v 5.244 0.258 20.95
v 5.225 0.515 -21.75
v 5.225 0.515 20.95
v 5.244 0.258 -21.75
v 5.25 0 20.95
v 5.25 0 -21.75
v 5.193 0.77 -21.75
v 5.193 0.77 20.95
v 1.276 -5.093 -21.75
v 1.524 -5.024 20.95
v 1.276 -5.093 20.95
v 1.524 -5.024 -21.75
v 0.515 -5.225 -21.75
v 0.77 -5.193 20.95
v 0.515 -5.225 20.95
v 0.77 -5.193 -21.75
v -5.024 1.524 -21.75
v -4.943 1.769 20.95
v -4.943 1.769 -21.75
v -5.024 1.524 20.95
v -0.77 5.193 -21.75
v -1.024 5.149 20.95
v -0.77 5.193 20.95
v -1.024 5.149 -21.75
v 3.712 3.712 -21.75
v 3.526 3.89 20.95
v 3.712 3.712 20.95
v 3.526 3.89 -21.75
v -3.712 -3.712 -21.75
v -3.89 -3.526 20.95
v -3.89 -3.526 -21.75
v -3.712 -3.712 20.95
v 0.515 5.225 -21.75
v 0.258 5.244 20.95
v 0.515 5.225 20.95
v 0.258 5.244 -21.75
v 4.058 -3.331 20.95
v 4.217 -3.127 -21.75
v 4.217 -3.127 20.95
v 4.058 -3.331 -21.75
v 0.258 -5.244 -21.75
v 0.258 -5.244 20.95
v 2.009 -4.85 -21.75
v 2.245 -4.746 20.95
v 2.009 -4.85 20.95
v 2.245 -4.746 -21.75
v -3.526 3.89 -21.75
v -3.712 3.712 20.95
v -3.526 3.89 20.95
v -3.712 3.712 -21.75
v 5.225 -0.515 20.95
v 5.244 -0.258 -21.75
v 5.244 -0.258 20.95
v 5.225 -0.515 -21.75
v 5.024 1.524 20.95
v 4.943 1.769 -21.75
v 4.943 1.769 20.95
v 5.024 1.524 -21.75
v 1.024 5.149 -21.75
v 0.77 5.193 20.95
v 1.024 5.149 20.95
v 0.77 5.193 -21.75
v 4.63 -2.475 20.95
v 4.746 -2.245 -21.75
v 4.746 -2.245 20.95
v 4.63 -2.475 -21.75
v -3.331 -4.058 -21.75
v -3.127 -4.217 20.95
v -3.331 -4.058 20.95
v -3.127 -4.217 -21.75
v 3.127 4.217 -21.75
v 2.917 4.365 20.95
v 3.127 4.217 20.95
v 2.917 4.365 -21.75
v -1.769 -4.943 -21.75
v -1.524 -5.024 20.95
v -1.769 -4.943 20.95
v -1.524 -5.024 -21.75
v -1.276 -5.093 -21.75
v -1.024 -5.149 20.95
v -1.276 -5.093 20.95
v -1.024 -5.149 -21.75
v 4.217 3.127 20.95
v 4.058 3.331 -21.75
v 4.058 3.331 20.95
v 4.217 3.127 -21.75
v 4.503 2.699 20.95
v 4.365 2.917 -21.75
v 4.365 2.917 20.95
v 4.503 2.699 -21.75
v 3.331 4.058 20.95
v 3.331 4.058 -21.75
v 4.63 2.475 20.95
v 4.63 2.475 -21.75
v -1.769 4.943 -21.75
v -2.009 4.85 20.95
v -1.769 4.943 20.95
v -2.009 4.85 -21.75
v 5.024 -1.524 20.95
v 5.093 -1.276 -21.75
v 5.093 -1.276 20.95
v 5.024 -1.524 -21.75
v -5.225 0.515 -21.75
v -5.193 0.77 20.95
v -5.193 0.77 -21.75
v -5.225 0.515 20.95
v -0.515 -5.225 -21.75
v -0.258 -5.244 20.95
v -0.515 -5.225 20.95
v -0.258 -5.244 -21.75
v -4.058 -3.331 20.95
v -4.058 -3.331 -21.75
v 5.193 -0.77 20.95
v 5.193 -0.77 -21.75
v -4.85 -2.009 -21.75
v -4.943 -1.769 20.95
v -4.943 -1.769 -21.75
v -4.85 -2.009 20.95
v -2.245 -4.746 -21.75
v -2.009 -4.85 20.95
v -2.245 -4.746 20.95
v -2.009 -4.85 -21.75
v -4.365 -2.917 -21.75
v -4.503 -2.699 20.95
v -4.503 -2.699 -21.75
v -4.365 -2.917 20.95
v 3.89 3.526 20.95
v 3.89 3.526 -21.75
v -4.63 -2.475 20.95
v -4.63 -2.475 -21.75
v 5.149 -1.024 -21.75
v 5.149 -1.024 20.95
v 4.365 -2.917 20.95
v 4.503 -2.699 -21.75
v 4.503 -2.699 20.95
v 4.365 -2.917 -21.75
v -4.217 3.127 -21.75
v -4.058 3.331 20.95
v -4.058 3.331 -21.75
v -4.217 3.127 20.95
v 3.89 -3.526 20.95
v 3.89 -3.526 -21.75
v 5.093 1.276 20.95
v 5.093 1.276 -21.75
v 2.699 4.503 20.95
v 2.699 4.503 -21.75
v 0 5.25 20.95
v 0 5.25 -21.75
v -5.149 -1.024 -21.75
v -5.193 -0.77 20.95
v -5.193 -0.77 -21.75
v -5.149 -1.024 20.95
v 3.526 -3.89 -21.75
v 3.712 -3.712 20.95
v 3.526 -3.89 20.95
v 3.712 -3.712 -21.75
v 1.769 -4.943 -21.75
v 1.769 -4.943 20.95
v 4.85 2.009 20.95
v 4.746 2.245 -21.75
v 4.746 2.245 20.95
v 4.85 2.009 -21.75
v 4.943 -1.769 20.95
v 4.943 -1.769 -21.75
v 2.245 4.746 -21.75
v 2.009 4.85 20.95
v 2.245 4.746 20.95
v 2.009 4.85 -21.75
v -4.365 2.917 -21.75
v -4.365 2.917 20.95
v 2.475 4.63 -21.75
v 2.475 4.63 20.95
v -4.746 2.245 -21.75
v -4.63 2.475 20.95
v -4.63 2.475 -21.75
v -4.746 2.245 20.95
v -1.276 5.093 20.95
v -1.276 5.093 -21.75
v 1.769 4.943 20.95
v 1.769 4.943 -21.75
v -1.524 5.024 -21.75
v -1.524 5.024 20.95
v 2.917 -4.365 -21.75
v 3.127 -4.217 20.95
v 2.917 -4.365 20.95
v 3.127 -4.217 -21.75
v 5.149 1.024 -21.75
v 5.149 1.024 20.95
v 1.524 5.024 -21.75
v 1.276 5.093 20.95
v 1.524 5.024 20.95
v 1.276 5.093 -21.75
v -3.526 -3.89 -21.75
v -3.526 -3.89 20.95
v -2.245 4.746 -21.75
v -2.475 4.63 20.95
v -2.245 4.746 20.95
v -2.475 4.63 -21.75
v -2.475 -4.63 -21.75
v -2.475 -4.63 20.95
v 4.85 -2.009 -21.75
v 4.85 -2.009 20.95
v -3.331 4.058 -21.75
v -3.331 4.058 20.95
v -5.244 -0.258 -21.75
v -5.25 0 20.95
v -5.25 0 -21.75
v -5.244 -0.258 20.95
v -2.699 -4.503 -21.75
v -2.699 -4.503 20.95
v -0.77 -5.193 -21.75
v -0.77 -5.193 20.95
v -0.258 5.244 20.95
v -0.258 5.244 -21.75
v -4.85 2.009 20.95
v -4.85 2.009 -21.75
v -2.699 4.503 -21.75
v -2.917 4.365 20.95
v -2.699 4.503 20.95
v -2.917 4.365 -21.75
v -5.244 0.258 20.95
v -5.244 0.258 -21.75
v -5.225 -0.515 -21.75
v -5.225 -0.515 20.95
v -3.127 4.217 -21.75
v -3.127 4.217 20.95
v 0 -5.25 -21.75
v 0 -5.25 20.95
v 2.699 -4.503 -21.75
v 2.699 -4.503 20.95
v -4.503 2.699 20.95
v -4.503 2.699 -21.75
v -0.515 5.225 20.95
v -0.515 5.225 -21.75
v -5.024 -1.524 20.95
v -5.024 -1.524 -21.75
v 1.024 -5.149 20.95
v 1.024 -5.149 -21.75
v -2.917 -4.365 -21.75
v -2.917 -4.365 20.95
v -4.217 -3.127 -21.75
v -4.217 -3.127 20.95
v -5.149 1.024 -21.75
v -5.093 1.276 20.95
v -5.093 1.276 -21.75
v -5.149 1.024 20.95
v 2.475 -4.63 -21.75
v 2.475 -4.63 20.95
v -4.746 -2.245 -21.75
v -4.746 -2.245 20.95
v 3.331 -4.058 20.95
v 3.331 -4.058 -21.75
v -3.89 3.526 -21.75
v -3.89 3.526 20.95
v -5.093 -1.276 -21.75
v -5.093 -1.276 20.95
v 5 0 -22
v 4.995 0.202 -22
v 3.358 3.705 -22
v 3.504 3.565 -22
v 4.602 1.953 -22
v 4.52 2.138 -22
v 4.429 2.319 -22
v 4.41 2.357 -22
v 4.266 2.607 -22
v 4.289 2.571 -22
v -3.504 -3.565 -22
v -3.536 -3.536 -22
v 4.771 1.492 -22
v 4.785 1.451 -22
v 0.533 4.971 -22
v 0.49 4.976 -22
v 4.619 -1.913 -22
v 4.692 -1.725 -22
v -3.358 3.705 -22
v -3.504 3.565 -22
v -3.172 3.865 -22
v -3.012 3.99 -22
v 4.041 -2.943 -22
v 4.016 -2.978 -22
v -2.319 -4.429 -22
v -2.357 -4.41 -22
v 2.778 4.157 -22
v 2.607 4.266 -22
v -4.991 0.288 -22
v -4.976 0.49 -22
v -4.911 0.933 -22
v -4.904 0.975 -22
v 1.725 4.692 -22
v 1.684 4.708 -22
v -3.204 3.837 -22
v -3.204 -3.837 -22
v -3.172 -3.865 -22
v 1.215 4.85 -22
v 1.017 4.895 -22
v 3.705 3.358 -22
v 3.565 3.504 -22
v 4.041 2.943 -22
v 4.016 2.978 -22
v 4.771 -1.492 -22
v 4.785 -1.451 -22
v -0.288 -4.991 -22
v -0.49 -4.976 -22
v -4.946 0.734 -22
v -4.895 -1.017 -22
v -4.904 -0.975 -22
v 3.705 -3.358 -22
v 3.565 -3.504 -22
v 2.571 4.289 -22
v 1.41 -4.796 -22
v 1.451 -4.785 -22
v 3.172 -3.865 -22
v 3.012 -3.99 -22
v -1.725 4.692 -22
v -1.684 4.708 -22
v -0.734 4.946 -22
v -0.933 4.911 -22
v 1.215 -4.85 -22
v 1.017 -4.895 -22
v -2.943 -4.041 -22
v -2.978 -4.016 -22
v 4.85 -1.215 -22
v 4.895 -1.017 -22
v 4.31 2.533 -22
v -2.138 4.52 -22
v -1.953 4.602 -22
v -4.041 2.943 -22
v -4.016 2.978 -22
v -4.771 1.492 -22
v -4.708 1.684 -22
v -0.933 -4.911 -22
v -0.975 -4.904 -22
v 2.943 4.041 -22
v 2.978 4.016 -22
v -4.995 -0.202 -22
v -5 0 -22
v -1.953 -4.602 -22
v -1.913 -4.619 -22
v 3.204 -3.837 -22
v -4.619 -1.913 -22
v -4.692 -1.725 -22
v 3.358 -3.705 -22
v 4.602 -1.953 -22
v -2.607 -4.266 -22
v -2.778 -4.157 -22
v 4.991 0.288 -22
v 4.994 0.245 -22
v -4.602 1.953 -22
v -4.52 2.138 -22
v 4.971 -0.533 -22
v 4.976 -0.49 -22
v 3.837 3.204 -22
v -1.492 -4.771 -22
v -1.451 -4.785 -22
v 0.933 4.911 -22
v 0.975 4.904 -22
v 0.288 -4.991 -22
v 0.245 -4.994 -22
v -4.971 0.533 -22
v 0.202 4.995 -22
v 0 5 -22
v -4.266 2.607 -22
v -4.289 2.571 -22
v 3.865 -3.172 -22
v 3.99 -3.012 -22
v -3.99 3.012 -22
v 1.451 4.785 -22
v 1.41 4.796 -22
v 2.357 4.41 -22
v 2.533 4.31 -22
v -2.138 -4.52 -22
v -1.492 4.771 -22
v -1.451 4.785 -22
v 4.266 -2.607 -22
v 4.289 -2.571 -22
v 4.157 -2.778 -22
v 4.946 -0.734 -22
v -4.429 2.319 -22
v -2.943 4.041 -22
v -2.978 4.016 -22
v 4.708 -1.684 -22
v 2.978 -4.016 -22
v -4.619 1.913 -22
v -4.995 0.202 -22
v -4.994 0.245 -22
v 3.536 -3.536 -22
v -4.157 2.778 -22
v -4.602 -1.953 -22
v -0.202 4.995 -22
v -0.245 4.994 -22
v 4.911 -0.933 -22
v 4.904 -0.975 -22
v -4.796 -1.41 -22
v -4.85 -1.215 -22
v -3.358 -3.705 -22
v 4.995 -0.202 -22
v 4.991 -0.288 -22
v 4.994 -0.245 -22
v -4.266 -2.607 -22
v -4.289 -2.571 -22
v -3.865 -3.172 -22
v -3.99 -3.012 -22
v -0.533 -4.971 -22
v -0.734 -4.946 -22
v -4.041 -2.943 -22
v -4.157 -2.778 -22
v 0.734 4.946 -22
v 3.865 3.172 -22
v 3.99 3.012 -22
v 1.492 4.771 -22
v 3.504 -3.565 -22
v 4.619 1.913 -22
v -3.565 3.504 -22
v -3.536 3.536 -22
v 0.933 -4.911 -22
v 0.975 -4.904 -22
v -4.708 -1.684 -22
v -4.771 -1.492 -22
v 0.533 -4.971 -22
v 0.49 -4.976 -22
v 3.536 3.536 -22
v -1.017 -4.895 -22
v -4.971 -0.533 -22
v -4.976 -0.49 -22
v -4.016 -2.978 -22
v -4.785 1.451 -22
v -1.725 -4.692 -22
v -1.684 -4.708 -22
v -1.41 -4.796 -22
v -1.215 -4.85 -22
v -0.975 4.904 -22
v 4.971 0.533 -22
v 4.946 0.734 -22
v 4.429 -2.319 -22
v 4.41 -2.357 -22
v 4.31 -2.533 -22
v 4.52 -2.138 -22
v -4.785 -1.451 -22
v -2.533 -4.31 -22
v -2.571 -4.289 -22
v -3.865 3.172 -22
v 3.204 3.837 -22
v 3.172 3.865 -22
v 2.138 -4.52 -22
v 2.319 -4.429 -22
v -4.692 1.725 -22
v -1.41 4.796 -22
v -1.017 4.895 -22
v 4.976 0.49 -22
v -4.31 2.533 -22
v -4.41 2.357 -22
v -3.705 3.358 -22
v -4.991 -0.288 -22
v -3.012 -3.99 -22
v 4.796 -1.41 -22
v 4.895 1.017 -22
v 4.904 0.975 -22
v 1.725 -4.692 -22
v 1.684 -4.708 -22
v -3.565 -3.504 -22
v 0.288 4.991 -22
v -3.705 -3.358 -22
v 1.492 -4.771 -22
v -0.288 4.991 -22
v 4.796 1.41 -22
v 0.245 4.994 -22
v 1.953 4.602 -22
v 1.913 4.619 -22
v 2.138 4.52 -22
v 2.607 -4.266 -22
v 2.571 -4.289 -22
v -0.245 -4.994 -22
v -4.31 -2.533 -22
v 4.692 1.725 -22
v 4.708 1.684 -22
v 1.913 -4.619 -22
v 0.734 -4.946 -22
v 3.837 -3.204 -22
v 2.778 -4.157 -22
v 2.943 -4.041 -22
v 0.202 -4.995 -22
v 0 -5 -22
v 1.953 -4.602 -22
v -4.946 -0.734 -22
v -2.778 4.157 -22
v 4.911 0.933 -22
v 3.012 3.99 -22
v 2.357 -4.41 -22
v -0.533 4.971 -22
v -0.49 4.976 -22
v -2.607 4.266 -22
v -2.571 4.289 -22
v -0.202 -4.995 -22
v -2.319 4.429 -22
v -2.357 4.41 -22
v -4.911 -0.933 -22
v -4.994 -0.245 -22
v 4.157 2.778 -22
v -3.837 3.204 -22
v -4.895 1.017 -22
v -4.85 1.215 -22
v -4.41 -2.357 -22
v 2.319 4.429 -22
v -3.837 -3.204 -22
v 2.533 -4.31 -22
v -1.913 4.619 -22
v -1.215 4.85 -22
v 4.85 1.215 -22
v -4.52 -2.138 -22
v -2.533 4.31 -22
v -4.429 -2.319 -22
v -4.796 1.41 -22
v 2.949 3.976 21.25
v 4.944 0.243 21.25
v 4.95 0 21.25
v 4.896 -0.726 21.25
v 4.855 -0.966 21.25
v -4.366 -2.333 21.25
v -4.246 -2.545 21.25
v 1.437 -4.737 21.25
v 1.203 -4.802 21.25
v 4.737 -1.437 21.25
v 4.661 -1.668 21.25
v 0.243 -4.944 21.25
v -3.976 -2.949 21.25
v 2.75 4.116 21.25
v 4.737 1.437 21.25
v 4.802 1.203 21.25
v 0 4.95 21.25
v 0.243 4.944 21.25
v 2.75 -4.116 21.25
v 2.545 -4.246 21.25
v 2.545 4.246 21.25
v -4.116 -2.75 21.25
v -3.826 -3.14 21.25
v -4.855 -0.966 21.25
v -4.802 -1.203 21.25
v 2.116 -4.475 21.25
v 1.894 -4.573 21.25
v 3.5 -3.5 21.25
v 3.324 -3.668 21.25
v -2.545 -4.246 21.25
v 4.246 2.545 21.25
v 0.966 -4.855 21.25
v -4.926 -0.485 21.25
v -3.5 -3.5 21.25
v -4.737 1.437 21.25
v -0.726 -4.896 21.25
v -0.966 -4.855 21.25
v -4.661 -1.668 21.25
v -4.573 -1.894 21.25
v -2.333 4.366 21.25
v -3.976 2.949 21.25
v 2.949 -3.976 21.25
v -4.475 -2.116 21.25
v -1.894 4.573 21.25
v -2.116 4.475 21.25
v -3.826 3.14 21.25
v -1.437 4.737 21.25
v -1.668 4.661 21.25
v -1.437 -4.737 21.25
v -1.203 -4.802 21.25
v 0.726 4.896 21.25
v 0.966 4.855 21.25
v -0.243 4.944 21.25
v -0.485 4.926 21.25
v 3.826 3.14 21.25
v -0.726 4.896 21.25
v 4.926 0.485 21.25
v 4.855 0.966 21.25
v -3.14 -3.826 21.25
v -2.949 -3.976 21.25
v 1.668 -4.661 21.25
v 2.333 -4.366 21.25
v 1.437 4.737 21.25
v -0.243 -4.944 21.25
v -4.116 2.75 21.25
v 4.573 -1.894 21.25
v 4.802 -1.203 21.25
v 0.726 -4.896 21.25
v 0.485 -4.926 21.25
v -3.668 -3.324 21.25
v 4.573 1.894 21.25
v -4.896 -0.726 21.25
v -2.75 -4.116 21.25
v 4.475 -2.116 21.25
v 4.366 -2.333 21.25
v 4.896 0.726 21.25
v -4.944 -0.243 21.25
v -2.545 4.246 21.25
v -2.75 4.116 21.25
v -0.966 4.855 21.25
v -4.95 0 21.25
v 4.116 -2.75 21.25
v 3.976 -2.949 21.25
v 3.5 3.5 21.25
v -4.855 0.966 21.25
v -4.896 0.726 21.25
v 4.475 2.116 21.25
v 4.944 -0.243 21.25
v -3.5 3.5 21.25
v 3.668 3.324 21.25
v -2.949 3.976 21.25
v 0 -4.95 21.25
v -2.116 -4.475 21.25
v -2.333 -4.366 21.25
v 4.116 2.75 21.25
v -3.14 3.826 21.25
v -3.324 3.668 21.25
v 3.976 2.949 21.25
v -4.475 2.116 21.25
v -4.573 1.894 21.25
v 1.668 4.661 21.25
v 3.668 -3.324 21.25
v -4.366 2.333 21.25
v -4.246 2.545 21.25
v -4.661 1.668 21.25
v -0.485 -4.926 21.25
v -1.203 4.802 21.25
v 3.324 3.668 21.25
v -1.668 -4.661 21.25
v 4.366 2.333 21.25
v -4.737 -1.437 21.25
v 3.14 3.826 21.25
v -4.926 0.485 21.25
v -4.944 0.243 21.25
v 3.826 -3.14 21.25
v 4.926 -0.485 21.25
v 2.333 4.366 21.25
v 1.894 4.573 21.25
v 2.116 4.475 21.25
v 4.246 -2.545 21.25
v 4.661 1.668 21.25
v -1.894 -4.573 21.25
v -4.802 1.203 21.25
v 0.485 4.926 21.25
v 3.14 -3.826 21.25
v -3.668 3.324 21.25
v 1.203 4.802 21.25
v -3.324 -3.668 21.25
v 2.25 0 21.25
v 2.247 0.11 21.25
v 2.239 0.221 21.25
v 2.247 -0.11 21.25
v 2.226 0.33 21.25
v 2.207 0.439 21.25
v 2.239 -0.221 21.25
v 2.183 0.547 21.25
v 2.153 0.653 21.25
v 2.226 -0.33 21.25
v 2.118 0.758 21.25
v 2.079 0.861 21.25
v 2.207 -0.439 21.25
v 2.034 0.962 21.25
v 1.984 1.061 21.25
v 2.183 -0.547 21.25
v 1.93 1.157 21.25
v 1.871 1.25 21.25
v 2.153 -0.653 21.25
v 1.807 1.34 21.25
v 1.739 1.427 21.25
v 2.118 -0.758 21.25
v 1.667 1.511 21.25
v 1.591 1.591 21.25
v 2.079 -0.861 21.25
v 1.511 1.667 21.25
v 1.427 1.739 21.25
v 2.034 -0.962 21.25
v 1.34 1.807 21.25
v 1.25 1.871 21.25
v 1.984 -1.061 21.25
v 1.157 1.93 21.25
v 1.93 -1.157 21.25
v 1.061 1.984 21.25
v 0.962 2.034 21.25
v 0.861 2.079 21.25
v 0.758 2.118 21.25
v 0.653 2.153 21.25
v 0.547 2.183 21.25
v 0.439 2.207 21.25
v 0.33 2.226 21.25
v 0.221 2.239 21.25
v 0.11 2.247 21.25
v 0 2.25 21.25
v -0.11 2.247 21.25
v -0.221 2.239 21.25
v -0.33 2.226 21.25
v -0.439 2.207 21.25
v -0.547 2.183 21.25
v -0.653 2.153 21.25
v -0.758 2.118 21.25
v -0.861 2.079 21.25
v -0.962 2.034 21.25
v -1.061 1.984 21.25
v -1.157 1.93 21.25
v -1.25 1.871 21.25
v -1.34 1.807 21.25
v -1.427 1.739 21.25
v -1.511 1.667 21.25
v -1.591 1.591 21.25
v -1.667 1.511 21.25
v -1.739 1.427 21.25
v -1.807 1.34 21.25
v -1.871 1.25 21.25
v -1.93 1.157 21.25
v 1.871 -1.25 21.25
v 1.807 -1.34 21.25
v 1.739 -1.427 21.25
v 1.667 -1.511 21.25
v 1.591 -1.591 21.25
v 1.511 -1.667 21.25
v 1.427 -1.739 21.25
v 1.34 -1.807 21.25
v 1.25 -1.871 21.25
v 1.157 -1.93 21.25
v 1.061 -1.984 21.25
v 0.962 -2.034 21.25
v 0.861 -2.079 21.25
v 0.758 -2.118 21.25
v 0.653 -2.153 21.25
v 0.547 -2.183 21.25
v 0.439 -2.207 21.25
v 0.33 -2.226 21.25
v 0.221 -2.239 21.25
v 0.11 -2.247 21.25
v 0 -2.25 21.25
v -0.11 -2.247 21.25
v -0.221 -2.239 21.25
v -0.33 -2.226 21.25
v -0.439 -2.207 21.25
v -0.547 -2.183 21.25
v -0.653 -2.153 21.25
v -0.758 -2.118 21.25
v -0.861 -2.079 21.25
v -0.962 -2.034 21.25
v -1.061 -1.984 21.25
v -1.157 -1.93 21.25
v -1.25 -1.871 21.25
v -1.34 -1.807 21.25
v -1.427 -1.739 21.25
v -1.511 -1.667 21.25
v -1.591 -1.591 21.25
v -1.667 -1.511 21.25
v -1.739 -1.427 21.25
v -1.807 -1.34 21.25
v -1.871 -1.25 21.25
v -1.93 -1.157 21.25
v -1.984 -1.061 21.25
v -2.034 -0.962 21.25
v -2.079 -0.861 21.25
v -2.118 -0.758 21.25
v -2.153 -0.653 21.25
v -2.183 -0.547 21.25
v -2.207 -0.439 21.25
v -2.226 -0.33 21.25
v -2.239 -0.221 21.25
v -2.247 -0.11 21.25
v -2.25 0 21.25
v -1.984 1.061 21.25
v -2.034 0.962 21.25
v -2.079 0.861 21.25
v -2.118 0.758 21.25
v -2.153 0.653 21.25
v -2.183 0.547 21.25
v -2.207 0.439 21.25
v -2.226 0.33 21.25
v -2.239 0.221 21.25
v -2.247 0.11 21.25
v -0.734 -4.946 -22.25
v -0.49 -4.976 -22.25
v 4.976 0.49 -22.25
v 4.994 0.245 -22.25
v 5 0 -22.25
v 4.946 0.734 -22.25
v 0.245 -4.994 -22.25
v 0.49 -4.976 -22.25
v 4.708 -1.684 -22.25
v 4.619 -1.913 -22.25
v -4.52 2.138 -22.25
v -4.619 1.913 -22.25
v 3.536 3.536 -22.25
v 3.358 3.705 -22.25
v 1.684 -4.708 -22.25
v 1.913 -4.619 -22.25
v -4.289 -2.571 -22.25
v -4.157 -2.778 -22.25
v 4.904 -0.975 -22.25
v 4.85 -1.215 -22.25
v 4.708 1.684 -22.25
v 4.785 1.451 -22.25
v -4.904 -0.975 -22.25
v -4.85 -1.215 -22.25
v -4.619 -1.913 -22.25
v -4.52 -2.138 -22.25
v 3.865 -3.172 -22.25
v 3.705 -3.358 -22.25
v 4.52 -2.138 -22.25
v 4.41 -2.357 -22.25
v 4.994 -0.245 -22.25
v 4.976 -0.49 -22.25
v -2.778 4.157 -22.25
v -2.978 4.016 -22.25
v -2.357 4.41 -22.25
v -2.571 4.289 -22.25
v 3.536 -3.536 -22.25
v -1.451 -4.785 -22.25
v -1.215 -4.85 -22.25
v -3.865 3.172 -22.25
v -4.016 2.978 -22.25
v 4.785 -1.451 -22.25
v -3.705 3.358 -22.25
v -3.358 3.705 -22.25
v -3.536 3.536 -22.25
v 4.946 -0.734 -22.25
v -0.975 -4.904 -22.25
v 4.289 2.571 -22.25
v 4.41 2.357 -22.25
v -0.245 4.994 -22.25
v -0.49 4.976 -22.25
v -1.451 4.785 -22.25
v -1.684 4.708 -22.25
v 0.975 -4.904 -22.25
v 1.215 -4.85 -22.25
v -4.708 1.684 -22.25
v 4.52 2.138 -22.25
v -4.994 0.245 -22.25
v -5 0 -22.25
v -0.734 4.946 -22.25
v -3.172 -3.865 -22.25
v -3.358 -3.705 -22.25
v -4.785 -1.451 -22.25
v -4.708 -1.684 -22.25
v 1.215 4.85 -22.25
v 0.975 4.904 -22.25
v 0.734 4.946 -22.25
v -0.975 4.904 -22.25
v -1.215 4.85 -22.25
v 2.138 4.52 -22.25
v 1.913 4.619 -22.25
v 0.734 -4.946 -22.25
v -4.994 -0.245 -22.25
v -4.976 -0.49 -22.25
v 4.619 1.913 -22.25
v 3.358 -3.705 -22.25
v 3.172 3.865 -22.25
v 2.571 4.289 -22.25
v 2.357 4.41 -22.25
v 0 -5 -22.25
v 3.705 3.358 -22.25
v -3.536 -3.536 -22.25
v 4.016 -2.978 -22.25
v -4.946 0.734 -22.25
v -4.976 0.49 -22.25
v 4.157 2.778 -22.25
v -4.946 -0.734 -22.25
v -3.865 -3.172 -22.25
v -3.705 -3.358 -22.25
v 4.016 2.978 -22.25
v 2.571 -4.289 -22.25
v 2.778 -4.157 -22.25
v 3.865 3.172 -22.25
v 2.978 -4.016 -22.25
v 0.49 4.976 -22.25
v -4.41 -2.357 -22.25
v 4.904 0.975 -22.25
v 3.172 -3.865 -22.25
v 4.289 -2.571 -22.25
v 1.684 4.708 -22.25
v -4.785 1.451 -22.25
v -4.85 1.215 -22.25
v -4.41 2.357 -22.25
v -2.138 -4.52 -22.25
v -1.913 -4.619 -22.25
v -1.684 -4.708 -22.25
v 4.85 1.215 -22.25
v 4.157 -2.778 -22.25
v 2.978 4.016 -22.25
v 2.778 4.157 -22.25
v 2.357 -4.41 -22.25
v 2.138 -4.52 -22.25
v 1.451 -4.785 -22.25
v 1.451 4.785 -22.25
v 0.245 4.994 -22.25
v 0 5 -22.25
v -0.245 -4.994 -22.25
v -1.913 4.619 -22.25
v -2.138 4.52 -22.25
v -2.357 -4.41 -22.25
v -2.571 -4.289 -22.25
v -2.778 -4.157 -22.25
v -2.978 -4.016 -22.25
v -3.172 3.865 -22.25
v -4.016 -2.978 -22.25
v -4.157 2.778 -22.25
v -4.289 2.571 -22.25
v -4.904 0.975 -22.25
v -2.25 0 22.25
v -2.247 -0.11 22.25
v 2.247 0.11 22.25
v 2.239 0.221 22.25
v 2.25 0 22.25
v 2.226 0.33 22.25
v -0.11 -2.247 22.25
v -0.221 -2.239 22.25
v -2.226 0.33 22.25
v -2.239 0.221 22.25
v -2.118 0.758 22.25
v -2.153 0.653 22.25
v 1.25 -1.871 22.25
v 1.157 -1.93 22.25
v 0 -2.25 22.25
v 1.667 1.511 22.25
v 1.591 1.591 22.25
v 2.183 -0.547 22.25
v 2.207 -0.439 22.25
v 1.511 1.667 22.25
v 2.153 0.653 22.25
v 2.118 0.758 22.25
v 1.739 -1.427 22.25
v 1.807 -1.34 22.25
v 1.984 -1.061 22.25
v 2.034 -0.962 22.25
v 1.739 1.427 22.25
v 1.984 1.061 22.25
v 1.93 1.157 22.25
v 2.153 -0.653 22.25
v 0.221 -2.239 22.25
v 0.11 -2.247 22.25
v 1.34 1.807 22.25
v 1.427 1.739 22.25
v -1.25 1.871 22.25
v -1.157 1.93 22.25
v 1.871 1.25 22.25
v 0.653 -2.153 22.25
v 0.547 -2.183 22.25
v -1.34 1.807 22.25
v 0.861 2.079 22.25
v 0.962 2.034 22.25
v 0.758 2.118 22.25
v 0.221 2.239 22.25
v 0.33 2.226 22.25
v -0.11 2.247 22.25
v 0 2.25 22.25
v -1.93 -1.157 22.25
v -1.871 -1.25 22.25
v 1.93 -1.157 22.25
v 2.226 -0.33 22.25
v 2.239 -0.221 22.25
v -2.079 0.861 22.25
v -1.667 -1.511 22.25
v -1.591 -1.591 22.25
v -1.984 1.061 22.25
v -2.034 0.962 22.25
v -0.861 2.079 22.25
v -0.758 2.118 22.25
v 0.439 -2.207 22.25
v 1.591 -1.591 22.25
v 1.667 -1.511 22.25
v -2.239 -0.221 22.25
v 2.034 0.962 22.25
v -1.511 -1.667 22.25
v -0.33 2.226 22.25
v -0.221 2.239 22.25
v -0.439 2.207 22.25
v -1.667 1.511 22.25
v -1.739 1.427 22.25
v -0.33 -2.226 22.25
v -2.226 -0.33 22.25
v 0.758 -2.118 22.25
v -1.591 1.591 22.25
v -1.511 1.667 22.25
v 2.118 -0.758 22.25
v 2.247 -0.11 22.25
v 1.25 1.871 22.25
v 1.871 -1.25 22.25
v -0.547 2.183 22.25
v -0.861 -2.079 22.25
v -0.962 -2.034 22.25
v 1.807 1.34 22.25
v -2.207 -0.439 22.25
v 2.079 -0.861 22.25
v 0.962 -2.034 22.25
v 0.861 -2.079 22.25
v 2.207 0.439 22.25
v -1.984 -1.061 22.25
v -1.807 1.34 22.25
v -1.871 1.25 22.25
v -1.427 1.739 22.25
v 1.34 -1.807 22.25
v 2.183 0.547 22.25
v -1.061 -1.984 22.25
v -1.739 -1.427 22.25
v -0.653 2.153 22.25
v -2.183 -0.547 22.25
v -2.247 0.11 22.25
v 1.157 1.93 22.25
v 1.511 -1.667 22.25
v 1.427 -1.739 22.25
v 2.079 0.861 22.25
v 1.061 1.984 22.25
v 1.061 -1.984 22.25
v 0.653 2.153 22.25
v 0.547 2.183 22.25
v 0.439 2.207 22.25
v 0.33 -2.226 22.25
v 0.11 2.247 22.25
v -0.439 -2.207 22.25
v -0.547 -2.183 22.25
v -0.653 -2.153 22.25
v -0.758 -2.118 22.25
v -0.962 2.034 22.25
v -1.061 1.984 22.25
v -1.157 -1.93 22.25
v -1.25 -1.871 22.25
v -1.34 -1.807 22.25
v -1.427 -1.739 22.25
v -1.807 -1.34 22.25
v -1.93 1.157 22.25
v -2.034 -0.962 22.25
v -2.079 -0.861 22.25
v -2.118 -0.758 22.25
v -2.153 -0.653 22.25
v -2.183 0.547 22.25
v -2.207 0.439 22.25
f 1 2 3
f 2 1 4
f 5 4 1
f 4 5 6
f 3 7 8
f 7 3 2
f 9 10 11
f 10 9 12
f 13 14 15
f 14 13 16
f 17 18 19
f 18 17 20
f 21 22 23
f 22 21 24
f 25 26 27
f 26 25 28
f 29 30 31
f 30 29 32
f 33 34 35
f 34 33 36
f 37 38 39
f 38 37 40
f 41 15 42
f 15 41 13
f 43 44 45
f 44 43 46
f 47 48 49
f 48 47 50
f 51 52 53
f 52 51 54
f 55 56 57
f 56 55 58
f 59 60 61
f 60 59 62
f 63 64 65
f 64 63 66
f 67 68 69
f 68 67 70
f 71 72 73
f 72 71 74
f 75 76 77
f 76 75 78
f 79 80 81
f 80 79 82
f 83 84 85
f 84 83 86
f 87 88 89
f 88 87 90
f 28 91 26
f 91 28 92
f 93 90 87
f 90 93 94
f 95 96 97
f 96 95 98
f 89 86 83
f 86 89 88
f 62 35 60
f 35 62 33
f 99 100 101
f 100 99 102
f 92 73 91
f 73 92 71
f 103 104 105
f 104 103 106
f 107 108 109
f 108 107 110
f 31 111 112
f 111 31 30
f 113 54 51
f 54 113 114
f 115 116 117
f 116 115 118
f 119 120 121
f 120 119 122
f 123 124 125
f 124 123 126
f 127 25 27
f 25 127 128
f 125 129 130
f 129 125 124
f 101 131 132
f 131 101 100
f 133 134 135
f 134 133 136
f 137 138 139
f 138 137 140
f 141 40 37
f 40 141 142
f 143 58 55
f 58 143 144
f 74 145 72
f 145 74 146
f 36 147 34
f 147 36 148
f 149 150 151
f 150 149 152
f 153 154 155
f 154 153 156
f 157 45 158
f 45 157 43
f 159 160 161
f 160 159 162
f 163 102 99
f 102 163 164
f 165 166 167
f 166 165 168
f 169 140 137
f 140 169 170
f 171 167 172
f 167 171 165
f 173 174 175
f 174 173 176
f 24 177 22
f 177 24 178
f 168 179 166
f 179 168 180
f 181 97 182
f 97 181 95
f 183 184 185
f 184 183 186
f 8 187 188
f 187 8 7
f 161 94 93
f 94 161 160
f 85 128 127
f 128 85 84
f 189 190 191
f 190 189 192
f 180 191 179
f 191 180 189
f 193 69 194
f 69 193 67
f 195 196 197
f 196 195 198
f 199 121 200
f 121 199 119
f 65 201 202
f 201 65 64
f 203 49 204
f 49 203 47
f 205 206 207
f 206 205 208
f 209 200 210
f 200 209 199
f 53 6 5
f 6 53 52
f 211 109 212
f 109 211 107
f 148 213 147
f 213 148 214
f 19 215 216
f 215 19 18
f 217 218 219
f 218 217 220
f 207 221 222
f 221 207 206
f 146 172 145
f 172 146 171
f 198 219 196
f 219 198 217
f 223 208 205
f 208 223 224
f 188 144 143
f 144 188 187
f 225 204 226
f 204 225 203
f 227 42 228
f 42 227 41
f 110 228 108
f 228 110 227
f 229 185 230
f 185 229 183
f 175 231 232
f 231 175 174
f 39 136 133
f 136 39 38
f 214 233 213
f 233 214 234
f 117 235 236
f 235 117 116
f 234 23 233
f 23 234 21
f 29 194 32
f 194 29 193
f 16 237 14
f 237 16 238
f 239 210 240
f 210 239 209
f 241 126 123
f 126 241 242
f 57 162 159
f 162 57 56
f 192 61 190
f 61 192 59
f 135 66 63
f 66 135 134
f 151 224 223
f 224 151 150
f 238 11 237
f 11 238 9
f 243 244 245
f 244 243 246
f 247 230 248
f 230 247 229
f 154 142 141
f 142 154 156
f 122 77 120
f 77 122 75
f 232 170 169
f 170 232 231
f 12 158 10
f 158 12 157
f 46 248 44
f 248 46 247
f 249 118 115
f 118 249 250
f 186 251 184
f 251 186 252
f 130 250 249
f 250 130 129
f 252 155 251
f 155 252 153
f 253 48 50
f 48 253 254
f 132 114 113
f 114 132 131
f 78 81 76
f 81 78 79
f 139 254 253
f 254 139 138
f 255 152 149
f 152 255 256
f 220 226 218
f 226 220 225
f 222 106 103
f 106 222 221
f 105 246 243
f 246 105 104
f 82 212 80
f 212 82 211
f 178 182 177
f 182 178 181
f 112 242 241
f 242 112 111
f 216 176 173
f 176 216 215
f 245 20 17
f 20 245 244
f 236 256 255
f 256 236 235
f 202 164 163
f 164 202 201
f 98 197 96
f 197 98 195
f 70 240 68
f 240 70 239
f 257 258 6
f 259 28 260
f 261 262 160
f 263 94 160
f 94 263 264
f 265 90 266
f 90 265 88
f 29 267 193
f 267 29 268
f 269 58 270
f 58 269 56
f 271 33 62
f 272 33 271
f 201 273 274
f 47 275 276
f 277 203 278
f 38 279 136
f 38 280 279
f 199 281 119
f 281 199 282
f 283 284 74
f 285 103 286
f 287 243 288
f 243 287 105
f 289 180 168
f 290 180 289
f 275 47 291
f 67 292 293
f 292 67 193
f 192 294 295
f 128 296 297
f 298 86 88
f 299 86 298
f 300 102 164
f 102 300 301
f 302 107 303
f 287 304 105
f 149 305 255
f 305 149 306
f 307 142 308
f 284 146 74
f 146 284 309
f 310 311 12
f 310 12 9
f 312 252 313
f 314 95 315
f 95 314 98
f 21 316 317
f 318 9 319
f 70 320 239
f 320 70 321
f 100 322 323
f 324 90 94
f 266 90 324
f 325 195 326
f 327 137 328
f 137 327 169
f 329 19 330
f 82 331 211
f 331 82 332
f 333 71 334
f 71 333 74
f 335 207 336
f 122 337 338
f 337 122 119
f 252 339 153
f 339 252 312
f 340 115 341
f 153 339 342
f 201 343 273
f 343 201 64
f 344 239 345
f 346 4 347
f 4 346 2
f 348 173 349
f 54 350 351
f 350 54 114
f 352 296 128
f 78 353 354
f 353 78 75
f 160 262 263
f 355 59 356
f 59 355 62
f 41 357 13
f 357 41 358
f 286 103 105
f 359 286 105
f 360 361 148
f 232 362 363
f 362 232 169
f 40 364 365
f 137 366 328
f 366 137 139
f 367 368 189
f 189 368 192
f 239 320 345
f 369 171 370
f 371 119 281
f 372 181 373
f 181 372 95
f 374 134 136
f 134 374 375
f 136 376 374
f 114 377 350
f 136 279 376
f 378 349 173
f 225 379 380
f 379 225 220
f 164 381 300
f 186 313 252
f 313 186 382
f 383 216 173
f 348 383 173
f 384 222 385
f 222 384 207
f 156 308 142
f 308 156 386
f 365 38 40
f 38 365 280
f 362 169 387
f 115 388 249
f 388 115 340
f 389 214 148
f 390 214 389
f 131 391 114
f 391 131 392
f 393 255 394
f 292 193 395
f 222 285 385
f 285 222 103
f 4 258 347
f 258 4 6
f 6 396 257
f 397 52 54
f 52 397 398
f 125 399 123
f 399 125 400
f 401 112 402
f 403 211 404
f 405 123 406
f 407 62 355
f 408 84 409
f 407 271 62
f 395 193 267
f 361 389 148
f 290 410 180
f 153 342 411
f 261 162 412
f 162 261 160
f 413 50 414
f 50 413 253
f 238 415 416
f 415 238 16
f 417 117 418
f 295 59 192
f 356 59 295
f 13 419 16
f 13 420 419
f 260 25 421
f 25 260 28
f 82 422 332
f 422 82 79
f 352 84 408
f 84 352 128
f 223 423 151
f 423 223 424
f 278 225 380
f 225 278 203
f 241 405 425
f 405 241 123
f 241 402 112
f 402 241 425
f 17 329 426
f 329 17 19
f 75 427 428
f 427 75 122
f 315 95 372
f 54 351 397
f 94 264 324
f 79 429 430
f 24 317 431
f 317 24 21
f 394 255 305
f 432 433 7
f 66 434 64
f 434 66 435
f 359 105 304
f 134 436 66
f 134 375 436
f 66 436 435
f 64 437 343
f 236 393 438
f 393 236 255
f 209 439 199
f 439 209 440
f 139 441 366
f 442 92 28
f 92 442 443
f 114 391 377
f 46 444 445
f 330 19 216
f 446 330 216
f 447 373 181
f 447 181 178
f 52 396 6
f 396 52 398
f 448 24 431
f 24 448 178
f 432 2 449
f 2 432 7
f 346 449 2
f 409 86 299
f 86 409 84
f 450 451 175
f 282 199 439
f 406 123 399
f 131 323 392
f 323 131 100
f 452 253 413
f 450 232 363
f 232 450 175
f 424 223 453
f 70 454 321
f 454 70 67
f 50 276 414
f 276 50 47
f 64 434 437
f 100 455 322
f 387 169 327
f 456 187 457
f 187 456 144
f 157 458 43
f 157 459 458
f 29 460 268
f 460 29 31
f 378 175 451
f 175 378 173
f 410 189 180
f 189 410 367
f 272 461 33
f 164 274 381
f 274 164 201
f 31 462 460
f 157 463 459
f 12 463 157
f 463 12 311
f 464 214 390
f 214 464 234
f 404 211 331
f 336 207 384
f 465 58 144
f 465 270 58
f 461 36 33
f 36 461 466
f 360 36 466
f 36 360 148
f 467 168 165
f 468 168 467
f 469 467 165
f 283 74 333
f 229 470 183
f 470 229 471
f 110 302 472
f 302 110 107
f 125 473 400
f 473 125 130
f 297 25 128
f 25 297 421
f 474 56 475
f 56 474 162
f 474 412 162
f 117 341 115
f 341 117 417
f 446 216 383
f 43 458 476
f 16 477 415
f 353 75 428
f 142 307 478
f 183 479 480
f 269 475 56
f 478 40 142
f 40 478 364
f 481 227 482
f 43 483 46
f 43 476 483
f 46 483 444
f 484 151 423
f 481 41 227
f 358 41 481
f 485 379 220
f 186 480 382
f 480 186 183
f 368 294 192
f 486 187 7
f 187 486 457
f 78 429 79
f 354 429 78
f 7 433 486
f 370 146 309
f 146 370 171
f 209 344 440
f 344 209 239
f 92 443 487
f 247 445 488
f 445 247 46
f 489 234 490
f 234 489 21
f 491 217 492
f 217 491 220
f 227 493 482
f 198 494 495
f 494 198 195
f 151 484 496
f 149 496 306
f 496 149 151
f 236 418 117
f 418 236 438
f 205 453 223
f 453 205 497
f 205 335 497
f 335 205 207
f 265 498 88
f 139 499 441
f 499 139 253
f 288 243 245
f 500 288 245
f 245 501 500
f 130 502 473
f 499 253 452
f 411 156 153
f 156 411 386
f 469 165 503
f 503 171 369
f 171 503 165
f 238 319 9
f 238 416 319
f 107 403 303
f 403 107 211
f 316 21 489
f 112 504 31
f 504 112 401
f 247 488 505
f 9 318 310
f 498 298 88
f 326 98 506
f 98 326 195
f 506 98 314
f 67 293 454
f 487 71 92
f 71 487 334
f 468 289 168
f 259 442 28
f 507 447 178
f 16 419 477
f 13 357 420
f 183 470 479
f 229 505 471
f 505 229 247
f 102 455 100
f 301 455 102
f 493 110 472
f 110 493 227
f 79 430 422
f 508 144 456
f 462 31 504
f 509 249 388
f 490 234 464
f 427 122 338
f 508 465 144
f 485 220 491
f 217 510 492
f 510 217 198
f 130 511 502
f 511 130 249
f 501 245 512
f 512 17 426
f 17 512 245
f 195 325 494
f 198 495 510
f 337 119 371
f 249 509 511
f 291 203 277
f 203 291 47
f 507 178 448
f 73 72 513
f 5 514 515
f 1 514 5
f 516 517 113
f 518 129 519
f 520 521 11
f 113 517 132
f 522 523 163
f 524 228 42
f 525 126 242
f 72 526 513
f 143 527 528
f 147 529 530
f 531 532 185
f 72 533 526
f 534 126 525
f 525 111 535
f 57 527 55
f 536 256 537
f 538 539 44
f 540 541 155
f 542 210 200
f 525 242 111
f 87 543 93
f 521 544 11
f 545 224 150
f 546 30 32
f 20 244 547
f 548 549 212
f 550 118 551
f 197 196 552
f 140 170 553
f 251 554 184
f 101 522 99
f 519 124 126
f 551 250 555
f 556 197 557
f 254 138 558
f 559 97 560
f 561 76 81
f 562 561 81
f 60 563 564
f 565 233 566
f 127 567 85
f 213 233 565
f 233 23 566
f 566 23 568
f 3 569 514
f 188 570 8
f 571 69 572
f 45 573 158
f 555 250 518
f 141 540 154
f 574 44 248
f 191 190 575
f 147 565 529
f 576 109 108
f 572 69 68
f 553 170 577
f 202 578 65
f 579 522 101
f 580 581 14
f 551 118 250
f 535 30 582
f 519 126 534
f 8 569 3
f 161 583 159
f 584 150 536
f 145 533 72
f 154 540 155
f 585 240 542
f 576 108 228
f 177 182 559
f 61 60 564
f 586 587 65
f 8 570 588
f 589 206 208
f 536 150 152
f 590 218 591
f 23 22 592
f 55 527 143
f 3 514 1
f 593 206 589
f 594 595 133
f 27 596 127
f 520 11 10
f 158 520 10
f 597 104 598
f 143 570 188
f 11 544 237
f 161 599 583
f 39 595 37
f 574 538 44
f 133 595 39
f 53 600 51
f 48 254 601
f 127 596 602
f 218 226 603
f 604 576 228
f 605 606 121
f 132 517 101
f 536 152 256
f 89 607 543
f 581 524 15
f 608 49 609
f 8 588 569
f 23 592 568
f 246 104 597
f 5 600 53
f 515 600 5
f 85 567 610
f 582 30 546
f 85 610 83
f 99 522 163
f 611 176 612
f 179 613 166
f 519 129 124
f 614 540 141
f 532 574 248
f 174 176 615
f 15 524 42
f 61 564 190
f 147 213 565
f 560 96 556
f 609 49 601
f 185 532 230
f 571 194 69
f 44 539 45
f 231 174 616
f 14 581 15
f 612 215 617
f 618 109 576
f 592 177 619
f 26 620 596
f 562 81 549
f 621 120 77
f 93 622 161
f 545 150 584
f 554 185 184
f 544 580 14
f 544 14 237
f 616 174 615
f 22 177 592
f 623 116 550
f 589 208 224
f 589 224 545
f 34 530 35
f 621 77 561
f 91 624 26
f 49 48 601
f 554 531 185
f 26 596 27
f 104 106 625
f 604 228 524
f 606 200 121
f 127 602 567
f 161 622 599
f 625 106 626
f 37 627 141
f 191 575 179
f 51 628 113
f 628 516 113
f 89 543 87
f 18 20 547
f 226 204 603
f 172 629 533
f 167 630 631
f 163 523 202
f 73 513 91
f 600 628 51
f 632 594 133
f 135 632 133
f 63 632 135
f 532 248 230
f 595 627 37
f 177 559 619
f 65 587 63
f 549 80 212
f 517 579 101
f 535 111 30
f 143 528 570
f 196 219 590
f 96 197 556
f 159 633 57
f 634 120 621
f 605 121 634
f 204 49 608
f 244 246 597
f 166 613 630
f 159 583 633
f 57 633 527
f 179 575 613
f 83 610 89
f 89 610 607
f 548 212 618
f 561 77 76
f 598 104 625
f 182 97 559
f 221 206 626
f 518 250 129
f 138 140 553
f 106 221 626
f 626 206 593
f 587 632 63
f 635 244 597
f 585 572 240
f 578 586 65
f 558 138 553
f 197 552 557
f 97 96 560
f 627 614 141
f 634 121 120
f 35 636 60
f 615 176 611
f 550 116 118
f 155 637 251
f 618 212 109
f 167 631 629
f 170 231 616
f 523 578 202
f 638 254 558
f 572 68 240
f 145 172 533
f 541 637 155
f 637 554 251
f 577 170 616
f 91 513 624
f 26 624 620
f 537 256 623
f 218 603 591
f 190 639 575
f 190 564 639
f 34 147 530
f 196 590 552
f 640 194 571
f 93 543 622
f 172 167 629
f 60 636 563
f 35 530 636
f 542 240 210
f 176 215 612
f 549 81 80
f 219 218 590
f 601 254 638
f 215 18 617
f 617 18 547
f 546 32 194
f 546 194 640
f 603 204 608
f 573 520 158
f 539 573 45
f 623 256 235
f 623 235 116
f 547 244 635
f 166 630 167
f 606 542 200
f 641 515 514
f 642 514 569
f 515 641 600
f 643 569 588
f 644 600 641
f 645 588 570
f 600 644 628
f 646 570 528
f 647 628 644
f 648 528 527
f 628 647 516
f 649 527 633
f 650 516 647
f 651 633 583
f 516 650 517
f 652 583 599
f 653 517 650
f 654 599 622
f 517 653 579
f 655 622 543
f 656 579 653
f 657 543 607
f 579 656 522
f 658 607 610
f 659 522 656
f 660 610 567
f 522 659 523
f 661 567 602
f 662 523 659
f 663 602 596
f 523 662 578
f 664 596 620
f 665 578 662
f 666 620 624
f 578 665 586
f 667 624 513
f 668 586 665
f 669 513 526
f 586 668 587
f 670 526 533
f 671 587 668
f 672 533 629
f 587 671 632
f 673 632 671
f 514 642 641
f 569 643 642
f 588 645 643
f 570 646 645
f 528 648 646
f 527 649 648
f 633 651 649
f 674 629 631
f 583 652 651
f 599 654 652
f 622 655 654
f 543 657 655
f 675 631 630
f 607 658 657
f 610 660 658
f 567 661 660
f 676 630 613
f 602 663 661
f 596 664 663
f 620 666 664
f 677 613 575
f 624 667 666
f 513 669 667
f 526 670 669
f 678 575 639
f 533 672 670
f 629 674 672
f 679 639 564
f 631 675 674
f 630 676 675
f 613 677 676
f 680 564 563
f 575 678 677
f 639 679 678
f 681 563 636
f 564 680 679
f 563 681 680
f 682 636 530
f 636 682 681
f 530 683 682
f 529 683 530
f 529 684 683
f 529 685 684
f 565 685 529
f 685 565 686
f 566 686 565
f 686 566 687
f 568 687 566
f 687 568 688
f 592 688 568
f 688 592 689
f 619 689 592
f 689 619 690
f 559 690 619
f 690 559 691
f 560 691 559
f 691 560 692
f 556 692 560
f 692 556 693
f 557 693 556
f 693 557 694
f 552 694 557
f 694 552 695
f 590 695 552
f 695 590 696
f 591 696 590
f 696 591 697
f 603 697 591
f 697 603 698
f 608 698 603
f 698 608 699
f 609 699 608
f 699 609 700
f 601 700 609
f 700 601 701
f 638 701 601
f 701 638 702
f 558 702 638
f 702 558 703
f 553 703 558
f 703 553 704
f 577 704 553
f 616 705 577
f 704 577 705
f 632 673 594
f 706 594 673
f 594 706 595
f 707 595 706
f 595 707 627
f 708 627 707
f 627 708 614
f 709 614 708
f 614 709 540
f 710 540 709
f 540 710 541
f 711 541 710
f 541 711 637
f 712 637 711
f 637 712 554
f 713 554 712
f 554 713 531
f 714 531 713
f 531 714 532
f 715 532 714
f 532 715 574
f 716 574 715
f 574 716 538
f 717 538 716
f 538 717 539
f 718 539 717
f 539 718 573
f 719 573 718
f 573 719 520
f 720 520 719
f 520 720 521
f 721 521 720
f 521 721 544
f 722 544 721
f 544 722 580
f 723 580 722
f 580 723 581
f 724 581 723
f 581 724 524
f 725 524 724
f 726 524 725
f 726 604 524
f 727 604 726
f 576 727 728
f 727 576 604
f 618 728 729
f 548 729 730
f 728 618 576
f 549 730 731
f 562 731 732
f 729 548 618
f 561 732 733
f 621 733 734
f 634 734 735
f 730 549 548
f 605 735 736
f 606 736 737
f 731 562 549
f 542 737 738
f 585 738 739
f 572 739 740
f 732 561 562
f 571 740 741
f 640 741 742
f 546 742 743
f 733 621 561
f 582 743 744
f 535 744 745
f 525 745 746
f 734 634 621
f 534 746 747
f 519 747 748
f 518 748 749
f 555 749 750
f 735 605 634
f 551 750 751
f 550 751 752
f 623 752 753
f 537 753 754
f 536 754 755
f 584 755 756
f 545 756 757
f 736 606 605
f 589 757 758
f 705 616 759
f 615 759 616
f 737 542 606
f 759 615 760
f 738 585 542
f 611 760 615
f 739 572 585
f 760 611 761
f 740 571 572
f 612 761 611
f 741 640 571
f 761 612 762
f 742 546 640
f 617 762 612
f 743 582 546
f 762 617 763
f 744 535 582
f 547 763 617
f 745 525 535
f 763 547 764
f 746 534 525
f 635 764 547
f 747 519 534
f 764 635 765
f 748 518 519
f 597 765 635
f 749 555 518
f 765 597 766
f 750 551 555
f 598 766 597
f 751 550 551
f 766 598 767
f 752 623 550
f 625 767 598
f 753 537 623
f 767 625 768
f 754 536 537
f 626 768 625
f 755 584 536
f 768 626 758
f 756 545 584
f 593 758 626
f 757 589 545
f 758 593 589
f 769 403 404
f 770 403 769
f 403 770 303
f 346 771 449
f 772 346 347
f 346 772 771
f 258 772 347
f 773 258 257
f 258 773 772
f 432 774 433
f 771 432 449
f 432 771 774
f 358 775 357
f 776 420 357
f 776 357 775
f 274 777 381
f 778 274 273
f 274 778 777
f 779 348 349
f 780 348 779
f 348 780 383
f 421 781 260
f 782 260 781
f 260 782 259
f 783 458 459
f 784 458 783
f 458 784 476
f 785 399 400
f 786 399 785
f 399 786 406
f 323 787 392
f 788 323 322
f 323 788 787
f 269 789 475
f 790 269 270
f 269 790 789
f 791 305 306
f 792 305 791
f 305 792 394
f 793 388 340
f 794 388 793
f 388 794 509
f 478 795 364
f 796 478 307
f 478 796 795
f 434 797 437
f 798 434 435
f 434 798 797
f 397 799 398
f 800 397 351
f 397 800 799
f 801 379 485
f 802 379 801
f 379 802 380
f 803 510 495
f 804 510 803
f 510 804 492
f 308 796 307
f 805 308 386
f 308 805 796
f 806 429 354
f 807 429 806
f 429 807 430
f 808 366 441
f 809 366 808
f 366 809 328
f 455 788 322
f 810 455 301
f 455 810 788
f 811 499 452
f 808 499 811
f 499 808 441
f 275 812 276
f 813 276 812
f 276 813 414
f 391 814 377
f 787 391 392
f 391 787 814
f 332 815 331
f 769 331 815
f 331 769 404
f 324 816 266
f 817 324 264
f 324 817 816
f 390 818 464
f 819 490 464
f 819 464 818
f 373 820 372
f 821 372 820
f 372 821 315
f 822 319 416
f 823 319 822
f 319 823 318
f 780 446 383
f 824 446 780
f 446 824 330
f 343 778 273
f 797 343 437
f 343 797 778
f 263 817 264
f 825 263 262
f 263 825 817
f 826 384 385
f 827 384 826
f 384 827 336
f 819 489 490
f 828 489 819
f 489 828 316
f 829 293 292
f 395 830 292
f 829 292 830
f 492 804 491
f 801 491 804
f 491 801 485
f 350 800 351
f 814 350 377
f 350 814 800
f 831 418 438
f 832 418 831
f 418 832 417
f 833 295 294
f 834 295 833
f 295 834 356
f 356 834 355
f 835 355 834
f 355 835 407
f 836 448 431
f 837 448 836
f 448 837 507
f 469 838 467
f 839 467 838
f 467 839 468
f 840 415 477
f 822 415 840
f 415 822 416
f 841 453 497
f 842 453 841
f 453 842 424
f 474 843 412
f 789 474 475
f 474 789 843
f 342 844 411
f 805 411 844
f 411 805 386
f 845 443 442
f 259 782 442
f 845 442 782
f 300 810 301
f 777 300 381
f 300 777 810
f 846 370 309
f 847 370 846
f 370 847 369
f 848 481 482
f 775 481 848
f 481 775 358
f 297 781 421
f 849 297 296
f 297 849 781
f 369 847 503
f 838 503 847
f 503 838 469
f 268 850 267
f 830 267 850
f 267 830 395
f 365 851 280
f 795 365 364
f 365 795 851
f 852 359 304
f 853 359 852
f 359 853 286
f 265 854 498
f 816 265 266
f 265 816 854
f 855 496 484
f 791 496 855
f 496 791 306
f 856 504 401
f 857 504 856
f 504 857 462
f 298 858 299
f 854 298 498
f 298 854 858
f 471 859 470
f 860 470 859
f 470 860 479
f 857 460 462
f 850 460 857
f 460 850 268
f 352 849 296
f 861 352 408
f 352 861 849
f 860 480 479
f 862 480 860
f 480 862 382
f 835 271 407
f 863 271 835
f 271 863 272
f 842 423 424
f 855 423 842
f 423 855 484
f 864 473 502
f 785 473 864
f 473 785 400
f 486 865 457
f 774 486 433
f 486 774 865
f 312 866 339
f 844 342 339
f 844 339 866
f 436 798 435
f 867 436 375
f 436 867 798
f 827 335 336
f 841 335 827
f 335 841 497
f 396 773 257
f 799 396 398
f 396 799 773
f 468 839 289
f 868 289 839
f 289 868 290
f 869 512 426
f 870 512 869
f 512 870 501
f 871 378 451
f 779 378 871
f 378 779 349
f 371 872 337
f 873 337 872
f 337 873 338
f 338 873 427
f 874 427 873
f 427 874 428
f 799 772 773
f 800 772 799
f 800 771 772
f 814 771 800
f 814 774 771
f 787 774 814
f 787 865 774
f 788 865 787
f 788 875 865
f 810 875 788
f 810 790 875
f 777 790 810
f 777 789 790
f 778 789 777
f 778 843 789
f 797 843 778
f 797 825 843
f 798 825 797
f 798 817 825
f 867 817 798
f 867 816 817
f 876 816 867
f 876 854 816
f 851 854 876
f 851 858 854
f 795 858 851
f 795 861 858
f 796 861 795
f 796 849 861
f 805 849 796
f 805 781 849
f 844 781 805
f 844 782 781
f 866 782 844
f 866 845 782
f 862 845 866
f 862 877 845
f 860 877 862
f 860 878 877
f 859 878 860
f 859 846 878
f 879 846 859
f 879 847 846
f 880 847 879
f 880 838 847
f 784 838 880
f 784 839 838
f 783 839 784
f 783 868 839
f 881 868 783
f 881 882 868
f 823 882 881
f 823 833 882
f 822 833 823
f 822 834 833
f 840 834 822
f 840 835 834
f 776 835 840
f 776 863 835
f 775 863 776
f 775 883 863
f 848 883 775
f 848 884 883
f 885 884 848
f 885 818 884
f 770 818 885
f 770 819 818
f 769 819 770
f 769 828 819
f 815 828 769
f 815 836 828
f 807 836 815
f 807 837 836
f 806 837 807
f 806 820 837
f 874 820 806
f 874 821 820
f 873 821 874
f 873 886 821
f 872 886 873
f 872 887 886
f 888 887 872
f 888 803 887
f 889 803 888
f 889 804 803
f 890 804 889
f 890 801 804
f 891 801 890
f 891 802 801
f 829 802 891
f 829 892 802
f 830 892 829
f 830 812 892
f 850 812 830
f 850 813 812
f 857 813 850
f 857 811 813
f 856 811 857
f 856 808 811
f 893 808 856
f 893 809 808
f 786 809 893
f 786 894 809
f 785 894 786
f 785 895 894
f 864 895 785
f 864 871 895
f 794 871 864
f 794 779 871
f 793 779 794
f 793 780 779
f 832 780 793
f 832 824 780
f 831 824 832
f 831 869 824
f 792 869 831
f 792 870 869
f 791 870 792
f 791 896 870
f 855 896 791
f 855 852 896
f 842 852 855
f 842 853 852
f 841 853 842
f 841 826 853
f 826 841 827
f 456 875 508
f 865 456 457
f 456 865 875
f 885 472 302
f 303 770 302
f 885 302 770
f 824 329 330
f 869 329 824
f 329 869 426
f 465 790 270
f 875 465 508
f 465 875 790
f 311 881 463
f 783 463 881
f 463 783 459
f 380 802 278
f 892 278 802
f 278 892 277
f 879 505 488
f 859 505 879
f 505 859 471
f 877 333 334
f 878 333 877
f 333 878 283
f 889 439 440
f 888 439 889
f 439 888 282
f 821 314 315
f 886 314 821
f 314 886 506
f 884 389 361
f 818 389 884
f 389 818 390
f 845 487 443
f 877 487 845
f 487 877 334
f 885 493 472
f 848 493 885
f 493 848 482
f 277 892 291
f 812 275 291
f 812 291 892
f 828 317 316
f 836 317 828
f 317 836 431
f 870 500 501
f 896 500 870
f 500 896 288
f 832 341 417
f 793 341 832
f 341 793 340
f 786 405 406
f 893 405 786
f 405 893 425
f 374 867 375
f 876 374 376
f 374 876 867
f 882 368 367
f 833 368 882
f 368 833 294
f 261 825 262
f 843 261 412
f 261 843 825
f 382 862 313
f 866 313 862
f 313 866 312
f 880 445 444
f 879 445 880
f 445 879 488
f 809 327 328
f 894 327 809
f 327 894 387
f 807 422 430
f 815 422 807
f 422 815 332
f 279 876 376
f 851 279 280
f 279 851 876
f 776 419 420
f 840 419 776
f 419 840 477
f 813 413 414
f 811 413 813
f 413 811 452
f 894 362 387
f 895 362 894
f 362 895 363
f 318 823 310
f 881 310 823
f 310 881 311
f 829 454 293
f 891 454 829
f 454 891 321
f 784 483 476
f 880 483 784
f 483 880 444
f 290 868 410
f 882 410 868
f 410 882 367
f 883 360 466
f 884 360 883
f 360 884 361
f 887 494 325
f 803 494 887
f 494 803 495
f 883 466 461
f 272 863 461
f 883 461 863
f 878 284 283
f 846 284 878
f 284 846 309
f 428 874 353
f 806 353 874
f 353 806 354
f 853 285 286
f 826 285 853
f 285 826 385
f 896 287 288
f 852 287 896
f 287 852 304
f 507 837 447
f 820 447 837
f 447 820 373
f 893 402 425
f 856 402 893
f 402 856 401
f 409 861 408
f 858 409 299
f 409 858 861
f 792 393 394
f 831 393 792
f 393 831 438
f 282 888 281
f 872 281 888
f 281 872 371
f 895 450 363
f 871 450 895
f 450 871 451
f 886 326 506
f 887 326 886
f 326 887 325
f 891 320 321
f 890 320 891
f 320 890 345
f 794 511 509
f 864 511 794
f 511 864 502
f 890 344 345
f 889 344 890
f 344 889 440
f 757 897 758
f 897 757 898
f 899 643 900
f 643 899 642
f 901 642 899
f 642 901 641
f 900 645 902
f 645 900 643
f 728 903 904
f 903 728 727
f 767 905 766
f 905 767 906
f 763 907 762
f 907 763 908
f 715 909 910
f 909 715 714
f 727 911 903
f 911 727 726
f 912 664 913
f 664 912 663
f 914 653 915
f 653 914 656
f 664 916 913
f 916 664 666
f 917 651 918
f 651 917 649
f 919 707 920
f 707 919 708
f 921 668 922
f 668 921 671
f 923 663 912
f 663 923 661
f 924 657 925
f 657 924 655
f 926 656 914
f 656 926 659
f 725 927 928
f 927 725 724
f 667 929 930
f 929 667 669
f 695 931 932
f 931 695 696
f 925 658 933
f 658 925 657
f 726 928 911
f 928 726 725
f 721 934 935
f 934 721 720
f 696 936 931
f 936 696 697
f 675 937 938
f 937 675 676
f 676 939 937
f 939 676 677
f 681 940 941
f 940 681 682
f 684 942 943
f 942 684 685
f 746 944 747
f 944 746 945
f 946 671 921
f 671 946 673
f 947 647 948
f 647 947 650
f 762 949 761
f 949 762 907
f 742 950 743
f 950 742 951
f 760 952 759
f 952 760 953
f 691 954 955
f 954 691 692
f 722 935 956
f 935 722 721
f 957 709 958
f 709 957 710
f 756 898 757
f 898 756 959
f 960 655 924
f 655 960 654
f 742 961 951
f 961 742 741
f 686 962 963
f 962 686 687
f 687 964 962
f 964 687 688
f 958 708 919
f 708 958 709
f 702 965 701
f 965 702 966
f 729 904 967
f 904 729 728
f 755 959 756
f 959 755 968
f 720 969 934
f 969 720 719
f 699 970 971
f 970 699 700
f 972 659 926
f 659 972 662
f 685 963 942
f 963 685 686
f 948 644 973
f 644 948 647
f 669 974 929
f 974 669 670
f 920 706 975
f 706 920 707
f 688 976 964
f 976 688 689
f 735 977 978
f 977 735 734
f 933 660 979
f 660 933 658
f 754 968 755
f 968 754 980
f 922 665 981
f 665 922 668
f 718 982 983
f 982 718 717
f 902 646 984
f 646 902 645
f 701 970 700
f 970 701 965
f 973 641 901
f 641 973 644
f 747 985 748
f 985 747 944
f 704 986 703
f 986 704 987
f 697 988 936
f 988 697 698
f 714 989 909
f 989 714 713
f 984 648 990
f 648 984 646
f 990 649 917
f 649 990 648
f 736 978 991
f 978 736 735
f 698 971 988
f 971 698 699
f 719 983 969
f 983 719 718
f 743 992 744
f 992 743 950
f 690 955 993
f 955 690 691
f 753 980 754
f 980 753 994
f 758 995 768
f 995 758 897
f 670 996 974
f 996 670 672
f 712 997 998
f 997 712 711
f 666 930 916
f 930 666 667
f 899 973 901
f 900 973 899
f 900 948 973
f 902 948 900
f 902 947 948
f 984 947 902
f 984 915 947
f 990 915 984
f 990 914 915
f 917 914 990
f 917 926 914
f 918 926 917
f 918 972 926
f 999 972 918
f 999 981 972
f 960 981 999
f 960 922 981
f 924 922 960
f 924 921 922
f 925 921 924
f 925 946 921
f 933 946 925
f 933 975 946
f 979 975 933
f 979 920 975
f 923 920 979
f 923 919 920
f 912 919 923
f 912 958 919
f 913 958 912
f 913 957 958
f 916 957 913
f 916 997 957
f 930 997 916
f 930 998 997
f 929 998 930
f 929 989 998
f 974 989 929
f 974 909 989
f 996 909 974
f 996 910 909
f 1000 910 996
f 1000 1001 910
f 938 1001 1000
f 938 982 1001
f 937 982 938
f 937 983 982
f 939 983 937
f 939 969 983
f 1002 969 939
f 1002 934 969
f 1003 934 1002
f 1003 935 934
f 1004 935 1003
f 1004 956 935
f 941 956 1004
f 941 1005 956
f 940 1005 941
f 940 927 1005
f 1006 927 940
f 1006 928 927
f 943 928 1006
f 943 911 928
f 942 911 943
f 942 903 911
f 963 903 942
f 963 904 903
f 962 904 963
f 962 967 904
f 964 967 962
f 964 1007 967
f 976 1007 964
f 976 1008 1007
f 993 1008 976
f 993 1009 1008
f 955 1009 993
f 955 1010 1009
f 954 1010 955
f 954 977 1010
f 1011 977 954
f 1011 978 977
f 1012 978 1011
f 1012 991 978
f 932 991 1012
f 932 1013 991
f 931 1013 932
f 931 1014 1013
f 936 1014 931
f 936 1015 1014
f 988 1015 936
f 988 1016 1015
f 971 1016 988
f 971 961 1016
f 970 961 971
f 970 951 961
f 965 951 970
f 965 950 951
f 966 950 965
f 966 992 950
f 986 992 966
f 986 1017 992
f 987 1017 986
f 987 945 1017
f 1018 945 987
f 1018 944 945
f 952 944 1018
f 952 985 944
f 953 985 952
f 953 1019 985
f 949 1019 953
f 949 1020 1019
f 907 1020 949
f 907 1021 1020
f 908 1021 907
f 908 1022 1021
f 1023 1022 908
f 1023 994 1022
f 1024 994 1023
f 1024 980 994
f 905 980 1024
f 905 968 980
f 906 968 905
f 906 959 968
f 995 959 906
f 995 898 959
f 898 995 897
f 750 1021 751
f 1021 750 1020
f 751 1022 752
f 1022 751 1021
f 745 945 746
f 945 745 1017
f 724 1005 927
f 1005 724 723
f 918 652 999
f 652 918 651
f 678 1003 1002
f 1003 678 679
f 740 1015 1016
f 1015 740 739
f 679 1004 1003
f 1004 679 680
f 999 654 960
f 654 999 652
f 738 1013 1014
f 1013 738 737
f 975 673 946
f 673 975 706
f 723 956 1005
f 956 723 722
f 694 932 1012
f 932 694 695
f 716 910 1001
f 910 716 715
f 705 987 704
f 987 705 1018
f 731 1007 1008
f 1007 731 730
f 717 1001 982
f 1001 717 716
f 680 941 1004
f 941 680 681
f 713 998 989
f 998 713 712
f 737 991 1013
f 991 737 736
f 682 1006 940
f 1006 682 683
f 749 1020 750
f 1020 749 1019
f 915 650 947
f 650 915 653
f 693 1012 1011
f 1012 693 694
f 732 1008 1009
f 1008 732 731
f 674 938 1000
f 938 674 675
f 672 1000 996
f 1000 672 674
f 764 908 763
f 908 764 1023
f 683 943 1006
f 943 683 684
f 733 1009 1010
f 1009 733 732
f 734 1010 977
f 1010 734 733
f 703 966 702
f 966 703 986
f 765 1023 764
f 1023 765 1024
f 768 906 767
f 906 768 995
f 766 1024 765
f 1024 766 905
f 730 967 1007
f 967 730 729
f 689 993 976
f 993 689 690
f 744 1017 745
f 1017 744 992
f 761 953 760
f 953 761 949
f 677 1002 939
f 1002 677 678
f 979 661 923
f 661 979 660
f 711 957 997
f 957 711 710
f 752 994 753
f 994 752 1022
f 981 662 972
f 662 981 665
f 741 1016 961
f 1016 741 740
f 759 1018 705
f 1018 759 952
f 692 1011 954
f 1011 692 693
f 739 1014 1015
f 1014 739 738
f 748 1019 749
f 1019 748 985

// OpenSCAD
$fn = 128;

// Parameters (mm)
overall_height_mm = 44.5;                 // total height
outer_diameter_mm = 10.5;                 // body diameter

positive_terminal_diameter_mm = 4.5;      // button diameter
positive_terminal_height_mm = 1.0;        // button height

negative_terminal_diameter_mm = 10.0;     // slight recess/plate diameter
negative_terminal_height_mm = 0.2;        // plate height

edge_chamfer_mm = 0.3;                    // end chamfer height
terminal_overlap_mm = 0.2;                // small overlap to guarantee connectivity

module battery() {
    r_body = outer_diameter_mm/2;
    r_pos  = positive_terminal_diameter_mm/2;
    r_neg  = negative_terminal_diameter_mm/2;

    // Ensure chamfers don't exceed available body length
    chamfer = min(edge_chamfer_mm, (overall_height_mm - positive_terminal_height_mm - negative_terminal_height_mm)/4);

    // Split total height into: bottom plate + main body + top button
    h_main = overall_height_mm - positive_terminal_height_mm - negative_terminal_height_mm;

    // Z references (centered model)
    z_bottom = -overall_height_mm/2;
    z_top    =  overall_height_mm/2;

    color("Silver")
    union() {
        // Main body with small end chamfers (connected solid)
        // Central straight section
        translate([0,0, z_bottom + negative_terminal_height_mm + chamfer + (h_main - 2*chamfer)/2])
            cylinder(h = max(0.01, h_main - 2*chamfer), r = r_body, center = true);

        // Bottom chamfer (taper to slightly smaller radius)
        translate([0,0, z_bottom + negative_terminal_height_mm + chamfer/2])
            cylinder(h = max(0.01, chamfer), r1 = max(0.01, r_body - chamfer), r2 = r_body, center = true);

        // Top chamfer (taper to slightly smaller radius)
        translate([0,0, z_top - positive_terminal_height_mm - chamfer/2])
            cylinder(h = max(0.01, chamfer), r1 = r_body, r2 = max(0.01, r_body - chamfer), center = true);

        // Negative terminal flat end-cap (slightly smaller than body, overlaps into body)
        translate([0,0, z_bottom + negative_terminal_height_mm/2 + terminal_overlap_mm/2])
            cylinder(h = negative_terminal_height_mm + terminal_overlap_mm, r = min(r_neg, r_body - 0.05), center = true);

        // Positive terminal button (overlaps into body)
        translate([0,0, z_top - positive_terminal_height_mm/2 - terminal_overlap_mm/2])
            cylinder(h = positive_terminal_height_mm + terminal_overlap_mm, r = r_pos, center = true);
    }
}

battery();
